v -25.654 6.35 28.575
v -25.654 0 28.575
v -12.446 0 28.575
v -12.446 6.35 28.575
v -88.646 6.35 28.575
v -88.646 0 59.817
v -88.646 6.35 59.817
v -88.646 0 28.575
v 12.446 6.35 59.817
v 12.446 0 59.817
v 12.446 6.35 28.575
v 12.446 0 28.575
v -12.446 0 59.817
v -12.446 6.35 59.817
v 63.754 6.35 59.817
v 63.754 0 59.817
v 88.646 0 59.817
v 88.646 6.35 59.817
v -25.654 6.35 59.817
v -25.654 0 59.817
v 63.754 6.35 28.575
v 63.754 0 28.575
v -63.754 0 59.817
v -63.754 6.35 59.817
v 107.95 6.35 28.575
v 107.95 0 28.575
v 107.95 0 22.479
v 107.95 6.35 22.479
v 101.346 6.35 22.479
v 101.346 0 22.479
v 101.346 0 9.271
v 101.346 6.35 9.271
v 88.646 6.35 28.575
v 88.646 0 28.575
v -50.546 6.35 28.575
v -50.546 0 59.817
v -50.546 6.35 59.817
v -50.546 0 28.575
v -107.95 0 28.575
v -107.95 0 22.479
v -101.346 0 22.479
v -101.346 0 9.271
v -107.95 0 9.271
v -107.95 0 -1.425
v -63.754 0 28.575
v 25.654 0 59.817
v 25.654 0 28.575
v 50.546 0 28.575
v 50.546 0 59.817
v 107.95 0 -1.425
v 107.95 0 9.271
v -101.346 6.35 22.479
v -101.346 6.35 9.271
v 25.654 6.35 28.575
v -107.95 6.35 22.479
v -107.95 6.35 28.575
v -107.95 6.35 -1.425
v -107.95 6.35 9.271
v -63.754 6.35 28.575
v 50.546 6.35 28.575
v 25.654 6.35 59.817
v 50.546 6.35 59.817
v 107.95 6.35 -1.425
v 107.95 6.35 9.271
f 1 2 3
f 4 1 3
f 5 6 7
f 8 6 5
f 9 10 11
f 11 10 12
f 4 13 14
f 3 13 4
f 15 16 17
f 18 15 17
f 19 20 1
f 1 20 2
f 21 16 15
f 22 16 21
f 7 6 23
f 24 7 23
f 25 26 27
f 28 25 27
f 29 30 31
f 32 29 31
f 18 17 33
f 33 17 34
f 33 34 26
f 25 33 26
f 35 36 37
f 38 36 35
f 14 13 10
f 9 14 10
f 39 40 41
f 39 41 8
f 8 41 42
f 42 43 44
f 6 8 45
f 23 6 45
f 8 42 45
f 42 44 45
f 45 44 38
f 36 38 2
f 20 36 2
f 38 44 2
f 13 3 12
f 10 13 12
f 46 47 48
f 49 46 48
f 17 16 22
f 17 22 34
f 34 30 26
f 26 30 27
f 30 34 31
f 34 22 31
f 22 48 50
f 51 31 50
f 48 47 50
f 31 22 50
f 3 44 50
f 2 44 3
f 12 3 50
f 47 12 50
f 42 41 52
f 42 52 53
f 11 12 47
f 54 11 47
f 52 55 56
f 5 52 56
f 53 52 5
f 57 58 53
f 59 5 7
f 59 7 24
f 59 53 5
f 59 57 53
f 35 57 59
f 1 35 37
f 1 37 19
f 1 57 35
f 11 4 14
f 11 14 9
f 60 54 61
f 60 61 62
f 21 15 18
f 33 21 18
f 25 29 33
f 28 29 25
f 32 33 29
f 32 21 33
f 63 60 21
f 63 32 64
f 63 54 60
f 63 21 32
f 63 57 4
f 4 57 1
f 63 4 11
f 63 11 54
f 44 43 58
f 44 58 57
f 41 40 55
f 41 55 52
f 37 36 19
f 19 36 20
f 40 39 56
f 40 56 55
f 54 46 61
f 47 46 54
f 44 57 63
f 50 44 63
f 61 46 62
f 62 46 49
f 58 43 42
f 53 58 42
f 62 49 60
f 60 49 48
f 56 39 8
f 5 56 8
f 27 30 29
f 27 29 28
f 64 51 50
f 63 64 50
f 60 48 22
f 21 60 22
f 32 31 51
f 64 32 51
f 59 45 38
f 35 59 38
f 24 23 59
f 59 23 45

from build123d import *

# Parameters (mm, degrees)
SKETCH1_W           = 215.9
SKETCH1_H           = 57.15
BOSS_EXTRUDE1_DEPTH = 6.35
SKETCH3_W           = 24.892
SKETCH3_H           = 31.242
BOSS_EXTRUDE2_DEPTH = 6.35
SKETCH4_W           = 13.208
SKETCH4_H           = 13.208
CUT_EXTRUDE2_DEPTH  = 124.578309136
SKETCH5_W           = 279.767575851
SKETCH5_H           = 12.7
CUT_EXTRUDE3_DEPTH  = 124.578309136
SKETCH6_W           = 215.9
SKETCH6_H           = 14.45
CUT_EXTRUDE4_DEPTH  = 124.578309136


with BuildPart() as part:
    # Sketch1 → Boss-Extrude1 (new body)
    with BuildSketch(Plane(origin=(0, 0, 0), x_dir=(1, 0, 0), z_dir=(0, 1, 0))):
        Rectangle(SKETCH1_W, SKETCH1_H)
    extrude(amount=BOSS_EXTRUDE1_DEPTH)

    # Sketch3 → Boss-Extrude2 (add)
    with BuildSketch(Plane(origin=(0, 0, 0), x_dir=(1, 0, 0), z_dir=(0, 1, 0))):
        with Locations((-76.2, -44.196)):
            Rectangle(SKETCH3_W, SKETCH3_H)
        with Locations((-38.1, -44.196)):
            Rectangle(SKETCH3_W, SKETCH3_H)
        with Locations((0, -44.196)):
            Rectangle(SKETCH3_W, SKETCH3_H)
        with Locations((38.1, -44.196)):
            Rectangle(SKETCH3_W, SKETCH3_H)
        with Locations((76.2, -44.196)):
            Rectangle(SKETCH3_W, SKETCH3_H)
    extrude(amount=BOSS_EXTRUDE2_DEPTH)

    # Sketch4 → Cut-Extrude2 (cut, through all)
    with BuildSketch(Plane(origin=(0, 0, 0), x_dir=(1, 0, 0), z_dir=(0, 1, 0))):
        with Locations((-107.95, 9.525)):
            Rectangle(SKETCH4_W, SKETCH4_H)
        with Locations((-107.95, -15.875)):
            Rectangle(SKETCH4_W, SKETCH4_H)
        with Locations((107.95, -15.875)):
            Rectangle(SKETCH4_W, SKETCH4_H)
        with Locations((107.95, 9.525)):
            Rectangle(SKETCH4_W, SKETCH4_H)
    extrude(amount=CUT_EXTRUDE2_DEPTH, mode=Mode.SUBTRACT)

    # Sketch5 → Cut-Extrude3 (cut, through all)
    with BuildSketch(Plane(origin=(0, 6.35, 0), x_dir=(1, 0, 0), z_dir=(0, 1, 0))):
        with Locations((31.933787926, 22.225)):
            Rectangle(SKETCH5_W, SKETCH5_H)
    extrude(amount=-CUT_EXTRUDE3_DEPTH, mode=Mode.SUBTRACT)

    # Sketch6 → Cut-Extrude4 (cut, through all)
    with BuildSketch(Plane(origin=(0, 6.35, 0), x_dir=(1, 0, 0), z_dir=(0, 1, 0))):
        with Locations((0, 8.65)):
            Rectangle(SKETCH6_W, SKETCH6_H)
    extrude(amount=-CUT_EXTRUDE4_DEPTH, mode=Mode.SUBTRACT)


solid = part.part
